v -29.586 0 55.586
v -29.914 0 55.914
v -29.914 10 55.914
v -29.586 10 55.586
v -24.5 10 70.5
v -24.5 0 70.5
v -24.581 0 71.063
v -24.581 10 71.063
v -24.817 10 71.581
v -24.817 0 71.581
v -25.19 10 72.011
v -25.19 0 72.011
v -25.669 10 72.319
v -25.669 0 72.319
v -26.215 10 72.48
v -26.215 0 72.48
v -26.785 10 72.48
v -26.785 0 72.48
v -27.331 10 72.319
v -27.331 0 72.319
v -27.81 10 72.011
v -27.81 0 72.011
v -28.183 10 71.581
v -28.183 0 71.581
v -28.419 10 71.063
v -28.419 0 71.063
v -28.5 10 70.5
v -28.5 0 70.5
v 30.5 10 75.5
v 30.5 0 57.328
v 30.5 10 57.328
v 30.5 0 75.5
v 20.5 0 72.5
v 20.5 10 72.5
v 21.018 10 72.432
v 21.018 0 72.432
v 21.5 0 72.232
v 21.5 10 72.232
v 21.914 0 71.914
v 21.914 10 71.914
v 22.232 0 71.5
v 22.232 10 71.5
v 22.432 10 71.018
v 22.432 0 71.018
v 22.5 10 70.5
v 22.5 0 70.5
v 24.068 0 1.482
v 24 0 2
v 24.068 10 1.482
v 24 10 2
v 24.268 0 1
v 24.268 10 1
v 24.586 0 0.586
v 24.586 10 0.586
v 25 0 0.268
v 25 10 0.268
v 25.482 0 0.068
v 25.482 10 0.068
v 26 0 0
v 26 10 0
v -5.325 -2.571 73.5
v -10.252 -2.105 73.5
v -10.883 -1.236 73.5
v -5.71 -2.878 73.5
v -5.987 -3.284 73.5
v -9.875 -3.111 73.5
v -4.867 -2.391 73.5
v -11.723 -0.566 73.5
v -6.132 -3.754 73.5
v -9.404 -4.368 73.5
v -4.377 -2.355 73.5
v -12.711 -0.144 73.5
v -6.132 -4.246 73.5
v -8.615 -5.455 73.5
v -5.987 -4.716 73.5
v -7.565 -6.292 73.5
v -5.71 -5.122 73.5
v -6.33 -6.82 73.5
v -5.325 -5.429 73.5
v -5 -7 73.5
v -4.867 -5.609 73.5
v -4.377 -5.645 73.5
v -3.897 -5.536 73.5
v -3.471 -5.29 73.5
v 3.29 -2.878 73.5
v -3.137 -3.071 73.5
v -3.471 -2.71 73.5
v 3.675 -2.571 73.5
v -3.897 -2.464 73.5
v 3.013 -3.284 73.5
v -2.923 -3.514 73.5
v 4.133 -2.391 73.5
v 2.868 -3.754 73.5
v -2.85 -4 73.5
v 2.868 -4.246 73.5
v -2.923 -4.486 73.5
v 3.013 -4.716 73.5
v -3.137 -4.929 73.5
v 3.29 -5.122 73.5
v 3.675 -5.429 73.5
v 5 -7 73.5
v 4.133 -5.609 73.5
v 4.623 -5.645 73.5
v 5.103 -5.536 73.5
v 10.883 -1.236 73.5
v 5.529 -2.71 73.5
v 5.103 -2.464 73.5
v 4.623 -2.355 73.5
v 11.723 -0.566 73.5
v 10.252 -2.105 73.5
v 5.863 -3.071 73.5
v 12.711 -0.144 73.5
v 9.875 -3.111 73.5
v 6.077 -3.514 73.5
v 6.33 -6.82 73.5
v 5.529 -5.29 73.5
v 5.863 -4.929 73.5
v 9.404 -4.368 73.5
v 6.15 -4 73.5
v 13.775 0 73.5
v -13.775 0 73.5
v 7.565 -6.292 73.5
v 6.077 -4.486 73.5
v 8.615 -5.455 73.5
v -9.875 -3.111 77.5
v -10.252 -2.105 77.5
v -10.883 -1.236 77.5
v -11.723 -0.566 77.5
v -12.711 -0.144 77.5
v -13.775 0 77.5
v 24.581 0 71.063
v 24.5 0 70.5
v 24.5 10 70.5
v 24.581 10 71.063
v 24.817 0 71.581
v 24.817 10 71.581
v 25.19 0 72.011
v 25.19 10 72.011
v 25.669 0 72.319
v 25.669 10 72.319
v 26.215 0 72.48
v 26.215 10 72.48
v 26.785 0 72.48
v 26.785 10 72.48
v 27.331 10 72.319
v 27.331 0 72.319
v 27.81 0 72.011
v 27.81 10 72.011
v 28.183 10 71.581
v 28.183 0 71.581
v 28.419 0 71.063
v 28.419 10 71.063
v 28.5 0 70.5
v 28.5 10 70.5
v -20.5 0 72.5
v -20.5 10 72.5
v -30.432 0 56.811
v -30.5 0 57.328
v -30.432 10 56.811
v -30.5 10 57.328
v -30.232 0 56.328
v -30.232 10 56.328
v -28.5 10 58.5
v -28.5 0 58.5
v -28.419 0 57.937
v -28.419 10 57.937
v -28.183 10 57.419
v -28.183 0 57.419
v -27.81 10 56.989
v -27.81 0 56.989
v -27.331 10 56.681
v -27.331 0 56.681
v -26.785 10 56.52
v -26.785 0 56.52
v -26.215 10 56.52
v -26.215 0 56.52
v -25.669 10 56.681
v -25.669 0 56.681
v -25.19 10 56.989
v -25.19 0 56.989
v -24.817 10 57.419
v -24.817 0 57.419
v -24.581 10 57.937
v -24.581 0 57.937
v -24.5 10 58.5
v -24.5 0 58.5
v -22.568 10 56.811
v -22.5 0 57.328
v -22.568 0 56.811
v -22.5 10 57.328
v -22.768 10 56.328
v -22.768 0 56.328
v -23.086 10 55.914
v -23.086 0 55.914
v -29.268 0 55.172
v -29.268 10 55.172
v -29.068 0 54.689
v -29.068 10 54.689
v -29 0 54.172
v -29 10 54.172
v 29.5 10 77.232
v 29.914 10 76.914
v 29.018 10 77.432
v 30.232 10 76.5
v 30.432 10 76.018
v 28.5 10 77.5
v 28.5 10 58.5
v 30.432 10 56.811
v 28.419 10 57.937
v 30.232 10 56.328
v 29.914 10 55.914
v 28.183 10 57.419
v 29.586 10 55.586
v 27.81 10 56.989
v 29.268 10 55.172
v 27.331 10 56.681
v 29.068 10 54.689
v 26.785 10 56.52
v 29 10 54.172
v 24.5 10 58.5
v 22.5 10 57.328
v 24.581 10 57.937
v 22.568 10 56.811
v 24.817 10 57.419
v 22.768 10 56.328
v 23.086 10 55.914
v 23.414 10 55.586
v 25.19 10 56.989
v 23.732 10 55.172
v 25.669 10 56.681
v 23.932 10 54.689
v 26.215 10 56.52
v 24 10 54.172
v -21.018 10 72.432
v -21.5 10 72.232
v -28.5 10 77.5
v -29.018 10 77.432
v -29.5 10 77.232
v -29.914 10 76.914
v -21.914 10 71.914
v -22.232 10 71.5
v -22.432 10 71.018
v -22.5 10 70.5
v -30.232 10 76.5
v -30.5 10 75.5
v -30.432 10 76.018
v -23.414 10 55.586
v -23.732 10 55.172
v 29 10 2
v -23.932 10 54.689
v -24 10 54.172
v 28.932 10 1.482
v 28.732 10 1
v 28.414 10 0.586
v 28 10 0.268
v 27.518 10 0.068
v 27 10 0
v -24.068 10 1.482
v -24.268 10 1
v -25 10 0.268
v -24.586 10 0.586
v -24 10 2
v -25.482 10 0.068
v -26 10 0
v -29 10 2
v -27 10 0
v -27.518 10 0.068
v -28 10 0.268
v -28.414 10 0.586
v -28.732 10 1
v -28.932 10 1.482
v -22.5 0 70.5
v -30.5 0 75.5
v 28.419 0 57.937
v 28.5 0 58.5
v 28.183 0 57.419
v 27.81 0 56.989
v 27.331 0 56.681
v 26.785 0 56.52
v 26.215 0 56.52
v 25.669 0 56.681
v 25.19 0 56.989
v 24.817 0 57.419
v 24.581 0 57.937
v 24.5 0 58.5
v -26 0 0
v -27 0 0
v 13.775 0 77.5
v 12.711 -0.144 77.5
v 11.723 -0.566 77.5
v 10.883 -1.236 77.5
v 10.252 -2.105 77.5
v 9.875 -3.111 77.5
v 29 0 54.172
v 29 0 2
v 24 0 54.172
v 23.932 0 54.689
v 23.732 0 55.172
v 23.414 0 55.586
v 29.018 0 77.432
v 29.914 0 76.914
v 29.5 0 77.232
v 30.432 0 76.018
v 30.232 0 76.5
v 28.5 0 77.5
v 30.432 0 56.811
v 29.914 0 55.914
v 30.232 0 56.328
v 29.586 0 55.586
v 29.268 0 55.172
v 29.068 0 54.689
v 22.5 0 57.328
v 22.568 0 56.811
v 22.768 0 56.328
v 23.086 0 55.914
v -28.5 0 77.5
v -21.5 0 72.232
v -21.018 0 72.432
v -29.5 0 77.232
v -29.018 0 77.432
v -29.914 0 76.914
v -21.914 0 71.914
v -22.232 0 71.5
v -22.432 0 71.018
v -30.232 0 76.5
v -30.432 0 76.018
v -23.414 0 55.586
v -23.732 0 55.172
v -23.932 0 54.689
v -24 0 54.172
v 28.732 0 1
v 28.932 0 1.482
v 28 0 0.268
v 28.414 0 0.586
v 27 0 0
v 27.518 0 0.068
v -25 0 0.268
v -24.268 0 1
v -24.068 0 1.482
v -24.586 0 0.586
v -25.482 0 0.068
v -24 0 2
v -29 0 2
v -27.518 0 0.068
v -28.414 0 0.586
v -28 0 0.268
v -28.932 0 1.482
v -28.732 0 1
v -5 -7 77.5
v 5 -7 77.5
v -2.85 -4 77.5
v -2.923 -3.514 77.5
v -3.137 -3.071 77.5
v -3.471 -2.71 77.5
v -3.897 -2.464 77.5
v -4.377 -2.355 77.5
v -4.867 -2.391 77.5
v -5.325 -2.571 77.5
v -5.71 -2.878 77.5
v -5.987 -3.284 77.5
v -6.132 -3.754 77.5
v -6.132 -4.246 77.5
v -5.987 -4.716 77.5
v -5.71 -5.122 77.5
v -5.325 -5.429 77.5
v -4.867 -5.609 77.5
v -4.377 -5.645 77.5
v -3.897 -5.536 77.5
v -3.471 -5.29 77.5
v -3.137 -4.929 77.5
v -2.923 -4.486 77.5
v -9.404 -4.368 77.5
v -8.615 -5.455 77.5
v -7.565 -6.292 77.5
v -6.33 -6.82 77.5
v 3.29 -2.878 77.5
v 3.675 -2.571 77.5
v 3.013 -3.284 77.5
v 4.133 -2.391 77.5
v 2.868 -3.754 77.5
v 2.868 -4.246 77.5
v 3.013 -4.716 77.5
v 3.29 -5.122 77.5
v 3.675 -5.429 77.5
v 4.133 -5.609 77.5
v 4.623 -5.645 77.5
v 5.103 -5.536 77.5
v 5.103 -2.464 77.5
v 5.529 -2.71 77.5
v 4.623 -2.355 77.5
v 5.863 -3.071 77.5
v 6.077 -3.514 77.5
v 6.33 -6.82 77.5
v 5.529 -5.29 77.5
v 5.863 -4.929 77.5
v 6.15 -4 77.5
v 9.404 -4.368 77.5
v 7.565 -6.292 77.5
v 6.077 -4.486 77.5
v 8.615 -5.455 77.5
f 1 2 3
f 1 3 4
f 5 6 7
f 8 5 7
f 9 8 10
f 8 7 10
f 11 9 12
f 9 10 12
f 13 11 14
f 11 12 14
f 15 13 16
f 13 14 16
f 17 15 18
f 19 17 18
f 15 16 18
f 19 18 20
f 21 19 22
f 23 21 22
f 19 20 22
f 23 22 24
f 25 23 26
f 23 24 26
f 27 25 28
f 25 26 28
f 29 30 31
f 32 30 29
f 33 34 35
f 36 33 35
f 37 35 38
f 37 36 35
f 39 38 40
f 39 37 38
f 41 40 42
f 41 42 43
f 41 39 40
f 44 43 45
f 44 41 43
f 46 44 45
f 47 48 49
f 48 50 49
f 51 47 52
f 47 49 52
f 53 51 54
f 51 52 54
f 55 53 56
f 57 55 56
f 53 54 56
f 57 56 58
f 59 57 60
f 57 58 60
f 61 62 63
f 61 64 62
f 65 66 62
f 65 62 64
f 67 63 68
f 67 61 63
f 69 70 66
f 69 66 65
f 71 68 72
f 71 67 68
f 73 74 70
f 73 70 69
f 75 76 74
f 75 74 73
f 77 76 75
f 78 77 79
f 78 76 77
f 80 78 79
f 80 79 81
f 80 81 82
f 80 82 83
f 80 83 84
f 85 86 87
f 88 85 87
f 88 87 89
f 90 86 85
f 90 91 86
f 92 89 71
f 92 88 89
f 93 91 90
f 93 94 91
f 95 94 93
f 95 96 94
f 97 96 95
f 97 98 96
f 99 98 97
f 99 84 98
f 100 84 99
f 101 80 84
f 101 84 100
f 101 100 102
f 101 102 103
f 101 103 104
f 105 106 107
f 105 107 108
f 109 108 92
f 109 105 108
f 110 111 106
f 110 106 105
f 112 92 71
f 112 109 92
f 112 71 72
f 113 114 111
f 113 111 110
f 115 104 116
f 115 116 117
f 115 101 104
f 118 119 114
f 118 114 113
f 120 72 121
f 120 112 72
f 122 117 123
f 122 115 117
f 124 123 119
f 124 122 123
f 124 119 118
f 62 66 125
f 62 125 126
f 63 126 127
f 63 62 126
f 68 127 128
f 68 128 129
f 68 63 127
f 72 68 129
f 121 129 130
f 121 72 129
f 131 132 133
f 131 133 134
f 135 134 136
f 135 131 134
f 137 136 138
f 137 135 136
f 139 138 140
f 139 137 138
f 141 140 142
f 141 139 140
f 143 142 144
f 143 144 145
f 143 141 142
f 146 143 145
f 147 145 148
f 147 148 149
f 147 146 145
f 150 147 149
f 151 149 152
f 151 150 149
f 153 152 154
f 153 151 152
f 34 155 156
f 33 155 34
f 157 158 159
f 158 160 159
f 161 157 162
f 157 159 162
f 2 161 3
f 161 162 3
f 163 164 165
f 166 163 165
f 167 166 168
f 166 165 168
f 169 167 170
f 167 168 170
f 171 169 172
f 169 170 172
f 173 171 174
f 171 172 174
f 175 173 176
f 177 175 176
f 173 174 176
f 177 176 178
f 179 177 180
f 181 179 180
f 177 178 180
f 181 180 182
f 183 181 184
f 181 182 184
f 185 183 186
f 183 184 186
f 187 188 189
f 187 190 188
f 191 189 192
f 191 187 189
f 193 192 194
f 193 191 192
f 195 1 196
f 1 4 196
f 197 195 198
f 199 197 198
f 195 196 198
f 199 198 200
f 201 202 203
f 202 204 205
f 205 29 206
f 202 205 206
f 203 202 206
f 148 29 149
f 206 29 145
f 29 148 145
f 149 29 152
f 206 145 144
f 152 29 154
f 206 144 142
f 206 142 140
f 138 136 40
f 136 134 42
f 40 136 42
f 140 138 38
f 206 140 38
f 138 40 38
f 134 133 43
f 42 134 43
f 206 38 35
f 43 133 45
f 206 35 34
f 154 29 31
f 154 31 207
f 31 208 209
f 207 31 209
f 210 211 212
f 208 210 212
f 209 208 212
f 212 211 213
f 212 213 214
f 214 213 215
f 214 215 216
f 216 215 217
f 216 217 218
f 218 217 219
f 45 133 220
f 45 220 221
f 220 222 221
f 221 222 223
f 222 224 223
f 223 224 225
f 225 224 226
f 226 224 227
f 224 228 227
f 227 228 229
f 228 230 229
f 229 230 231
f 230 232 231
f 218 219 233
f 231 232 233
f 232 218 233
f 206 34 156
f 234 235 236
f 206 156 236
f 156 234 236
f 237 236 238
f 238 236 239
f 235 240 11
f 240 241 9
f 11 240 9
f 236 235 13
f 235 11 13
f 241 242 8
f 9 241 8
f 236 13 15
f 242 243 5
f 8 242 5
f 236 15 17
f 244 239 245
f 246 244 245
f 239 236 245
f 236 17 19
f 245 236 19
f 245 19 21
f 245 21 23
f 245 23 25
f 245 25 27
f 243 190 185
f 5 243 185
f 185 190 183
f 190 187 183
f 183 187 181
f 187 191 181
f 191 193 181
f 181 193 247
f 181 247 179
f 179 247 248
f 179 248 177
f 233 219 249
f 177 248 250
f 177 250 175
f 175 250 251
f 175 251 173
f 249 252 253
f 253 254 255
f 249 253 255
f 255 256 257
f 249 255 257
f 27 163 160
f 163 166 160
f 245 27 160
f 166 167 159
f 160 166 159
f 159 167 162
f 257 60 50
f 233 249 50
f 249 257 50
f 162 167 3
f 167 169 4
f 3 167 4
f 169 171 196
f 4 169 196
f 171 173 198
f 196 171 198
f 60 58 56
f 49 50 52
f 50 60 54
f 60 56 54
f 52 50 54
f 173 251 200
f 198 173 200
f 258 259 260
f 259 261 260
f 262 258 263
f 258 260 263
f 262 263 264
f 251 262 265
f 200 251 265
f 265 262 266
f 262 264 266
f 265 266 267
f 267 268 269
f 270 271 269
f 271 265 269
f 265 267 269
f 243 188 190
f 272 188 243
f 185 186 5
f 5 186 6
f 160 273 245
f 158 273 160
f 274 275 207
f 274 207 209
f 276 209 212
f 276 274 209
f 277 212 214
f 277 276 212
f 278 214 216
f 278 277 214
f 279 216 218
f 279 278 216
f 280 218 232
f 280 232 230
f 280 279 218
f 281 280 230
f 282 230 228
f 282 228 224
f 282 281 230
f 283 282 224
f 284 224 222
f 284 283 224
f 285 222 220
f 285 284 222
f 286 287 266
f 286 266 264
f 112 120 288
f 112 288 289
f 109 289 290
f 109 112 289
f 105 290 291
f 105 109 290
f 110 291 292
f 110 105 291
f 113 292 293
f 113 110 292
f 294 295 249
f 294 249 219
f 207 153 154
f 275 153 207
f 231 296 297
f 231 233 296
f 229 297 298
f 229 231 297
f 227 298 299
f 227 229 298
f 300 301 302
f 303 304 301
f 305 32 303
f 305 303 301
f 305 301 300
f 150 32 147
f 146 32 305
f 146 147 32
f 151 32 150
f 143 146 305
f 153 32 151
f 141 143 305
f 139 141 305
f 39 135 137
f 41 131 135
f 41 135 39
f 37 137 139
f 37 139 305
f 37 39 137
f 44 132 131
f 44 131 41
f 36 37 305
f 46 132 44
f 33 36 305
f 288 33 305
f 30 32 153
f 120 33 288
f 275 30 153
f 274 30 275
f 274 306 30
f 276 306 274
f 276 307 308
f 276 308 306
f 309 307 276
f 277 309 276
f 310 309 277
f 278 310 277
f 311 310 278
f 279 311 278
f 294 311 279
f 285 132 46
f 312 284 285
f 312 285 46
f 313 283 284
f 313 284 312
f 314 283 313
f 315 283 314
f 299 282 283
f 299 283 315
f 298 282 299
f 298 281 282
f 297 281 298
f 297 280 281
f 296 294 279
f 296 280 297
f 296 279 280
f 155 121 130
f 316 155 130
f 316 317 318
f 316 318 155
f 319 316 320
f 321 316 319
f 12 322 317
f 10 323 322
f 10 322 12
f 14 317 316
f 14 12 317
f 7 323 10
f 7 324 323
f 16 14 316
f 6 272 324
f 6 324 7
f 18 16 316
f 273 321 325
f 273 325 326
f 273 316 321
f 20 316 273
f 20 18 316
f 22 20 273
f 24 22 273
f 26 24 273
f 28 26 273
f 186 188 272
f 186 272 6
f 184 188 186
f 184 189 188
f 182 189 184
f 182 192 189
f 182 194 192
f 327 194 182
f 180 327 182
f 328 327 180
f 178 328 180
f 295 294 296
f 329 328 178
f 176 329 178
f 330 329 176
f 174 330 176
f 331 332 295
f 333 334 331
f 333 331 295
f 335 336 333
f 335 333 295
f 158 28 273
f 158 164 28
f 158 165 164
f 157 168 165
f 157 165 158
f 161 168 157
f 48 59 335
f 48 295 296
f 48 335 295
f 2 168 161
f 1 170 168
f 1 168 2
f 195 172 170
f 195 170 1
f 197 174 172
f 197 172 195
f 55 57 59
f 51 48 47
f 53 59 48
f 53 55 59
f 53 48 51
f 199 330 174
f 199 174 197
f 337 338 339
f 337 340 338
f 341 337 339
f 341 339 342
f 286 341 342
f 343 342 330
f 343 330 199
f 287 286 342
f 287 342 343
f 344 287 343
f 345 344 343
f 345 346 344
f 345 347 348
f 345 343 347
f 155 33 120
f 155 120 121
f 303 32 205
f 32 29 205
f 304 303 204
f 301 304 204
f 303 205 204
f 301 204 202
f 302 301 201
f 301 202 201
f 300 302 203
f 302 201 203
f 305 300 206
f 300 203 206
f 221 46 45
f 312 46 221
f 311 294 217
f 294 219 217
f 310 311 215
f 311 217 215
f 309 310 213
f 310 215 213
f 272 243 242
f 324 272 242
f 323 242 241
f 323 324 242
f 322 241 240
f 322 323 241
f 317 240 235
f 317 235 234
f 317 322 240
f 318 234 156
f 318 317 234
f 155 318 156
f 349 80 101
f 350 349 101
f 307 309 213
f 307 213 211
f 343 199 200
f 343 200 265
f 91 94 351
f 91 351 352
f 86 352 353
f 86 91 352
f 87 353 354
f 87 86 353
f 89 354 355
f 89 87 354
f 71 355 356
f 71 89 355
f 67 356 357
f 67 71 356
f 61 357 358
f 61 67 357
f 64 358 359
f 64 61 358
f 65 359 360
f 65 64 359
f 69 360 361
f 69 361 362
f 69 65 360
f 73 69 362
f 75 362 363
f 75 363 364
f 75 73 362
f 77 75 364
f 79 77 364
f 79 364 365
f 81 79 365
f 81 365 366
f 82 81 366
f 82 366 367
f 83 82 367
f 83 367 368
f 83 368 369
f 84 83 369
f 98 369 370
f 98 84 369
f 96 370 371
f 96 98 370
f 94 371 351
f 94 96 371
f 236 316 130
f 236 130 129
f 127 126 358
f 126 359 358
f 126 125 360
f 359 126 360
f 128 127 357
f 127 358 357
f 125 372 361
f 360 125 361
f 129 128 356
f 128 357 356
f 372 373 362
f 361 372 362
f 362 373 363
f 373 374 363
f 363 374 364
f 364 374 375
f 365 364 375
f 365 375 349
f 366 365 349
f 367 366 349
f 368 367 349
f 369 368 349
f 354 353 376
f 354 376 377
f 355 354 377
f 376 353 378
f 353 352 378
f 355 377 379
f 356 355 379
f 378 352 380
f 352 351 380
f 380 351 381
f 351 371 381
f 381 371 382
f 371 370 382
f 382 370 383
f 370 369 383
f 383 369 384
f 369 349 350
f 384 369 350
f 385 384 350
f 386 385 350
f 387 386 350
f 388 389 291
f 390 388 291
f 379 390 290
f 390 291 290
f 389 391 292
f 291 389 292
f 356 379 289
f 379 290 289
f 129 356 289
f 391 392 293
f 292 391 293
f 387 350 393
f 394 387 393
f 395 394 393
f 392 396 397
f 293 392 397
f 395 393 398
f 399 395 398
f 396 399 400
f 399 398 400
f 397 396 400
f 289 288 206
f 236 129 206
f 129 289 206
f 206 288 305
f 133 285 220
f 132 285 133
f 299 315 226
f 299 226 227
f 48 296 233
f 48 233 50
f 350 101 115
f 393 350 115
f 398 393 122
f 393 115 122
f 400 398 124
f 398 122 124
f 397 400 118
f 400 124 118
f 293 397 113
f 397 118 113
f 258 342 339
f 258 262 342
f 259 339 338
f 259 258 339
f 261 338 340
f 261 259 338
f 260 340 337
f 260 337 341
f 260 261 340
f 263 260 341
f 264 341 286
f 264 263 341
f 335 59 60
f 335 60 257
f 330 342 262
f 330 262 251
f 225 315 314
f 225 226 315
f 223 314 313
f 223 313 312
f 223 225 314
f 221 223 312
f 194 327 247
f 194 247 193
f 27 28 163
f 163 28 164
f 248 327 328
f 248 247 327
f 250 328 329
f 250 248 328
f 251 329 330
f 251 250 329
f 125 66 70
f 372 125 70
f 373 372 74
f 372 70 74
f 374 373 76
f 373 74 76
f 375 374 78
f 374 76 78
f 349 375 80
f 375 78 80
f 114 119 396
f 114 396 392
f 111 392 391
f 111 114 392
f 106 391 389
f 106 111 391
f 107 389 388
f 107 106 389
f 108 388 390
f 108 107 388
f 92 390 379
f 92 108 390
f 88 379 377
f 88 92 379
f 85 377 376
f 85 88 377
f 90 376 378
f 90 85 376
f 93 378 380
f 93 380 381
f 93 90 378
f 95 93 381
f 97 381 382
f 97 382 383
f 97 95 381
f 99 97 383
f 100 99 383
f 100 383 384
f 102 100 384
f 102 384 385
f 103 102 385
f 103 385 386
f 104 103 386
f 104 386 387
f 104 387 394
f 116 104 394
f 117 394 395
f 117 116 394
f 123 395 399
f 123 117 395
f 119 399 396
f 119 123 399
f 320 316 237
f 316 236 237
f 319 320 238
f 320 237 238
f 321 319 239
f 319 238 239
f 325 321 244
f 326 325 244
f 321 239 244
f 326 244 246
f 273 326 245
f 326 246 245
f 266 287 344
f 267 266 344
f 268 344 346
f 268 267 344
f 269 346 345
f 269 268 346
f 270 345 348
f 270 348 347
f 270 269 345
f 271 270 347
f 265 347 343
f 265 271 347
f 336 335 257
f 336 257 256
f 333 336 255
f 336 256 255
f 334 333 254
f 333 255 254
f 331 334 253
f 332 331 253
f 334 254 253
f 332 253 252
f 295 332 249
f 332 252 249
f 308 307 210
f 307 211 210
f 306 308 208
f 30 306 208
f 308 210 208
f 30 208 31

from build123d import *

# Parameters (mm, degrees)
BOSS_EXTRUDE1_DEPTH = 10
FILLET1_R           = 2
FILLET2_R           = 2
BLOCK_START         = 73.5
BLOCK_OUTLINE_R     = 1.65
BLOCK_DEPTH         = 4
BLOCK_START_2       = 77.5
BLOCK_2_DEPTH       = 0.2
CUT_EXTRUDE1_START  = -0.2
CUT_EXTRUDE1_DEPTH  = 0.2
FILLET4_R           = 4


# Read off the part's stored shape, not the designer's step: block
with BuildPart() as part:
    # Sketch1 → Boss-Extrude1 (new body)
    with BuildSketch(Plane(origin=(0, 0, 0), x_dir=(1, 0, 0), z_dir=(0, 1, 0))):
        with BuildLine():
            Line((24, -55), (24, 0))
            Line((24, 0), (29, 0))
            Line((29, 0), (29, -55))
            Line((29, -55), (30.5, -56.5))
            Line((30.5, -56.5), (30.5, -70.5))
            Line((30.5, -70.5), (30.5, -77.5))
            Line((30.5, -77.5), (-30.5, -77.5))
            Line((-30.5, -77.5), (-30.5, -70.5))
            Line((-30.5, -70.5), (-30.5, -56.5))
            Line((-30.5, -56.5), (-29, -55))
            Line((-29, -55), (-29, 0))
            Line((-29, 0), (-24, 0))
            Line((-24, 0), (-24, -55))
            Line((-24, -55), (-22.5, -56.5))
            Line((-22.5, -56.5), (-22.5, -70.5))
            ThreePointArc((-22.5, -70.5), (-21.914213562, -71.914213562), (-20.5, -72.5))
            Line((-20.5, -72.5), (20.5, -72.5))
            ThreePointArc((20.5, -72.5), (21.914213562, -71.914213562), (22.5, -70.5))
            Line((22.5, -70.5), (22.5, -56.5))
            Line((22.5, -56.5), (24, -55))
        make_face()
        with BuildLine():
            Line((24.5, -58.5), (24.5, -70.5))
            ThreePointArc((24.5, -70.5), (26.5, -72.5), (28.5, -70.5))
            Line((28.5, -70.5), (28.5, -58.5))
            ThreePointArc((28.5, -58.5), (26.5, -56.5), (24.5, -58.5))
        make_face(mode=Mode.SUBTRACT)
        with BuildLine():
            Line((-28.5, -70.5), (-28.5, -58.5))
            ThreePointArc((-28.5, -58.5), (-26.5, -56.5), (-24.5, -58.5))
            Line((-24.5, -58.5), (-24.5, -70.5))
            ThreePointArc((-24.5, -70.5), (-26.5, -72.5), (-28.5, -70.5))
        make_face(mode=Mode.SUBTRACT)
    extrude(amount=BOSS_EXTRUDE1_DEPTH)

    # Fillet1
    fillet1_edges = [part.edges().sort_by_distance(p)[0] for p in [
        (30.5, 5, 77.5),
        (-30.5, 5, 77.5),
        (-30.5, 5, 56.5),
        (-29, 5, 55),
        (-24, 5, 55),
        (-22.5, 5, 56.5),
        (22.5, 5, 56.5),
        (24, 5, 55),
        (29, 5, 55),
        (30.5, 5, 56.5),
    ]]
    fillet(fillet1_edges, radius=FILLET1_R)

    # Fillet2
    fillet2_edges = [part.edges().sort_by_distance(p)[0] for p in [
        (-29, 5, 0),
        (-24, 5, 0),
        (24, 5, 0),
        (29, 5, 0),
    ]]
    fillet(fillet2_edges, radius=FILLET2_R)


with BuildPart() as body_2:
    # block outline → block (new body)
    with BuildSketch(Plane.XY.offset(BLOCK_START)):
        with BuildLine():
            Line((-10, 0), (-10, -2))
            ThreePointArc((-10, -2), (-8.535533906, -5.535533906), (-5, -7))
            Line((-5, -7), (5, -7))
            ThreePointArc((5, -7), (8.535533906, -5.535533906), (10, -2))
            Line((10, -2), (10, 0))
            Line((10, 0), (-10, 0))
        make_face()
        with Locations((-4.5, -4)):
            Circle(BLOCK_OUTLINE_R, mode=Mode.SUBTRACT)
        with Locations((4.5, -4)):
            Circle(BLOCK_OUTLINE_R, mode=Mode.SUBTRACT)
    extrude(amount=BLOCK_DEPTH)

    # block 2 outline → block 2 (add)
    with BuildSketch(Plane.XY.offset(BLOCK_START_2)):
        with BuildLine():
            ThreePointArc((-3, -0.5), (-3.2, -0.7), (-3, -0.9))
            Line((-3, -0.9), (3, -0.9))
            ThreePointArc((3, -0.9), (3.2, -0.7), (3, -0.5))
            Line((3, -0.5), (-3, -0.5))
        make_face()
    extrude(amount=BLOCK_2_DEPTH)


with BuildPart() as part_1:
    add(part.part)

    # Combine1: union body 2
    add(body_2.part)

    # Sketch3 → Cut-Extrude1 (cut)
    with BuildSketch(Plane.XY.offset(77.7).offset(CUT_EXTRUDE1_START)):
        with BuildLine():
            Line((-3, -0.9), (3, -0.9))
            ThreePointArc((3, -0.9), (3.2, -0.7), (3, -0.5))
            Line((3, -0.5), (-3, -0.5))
            ThreePointArc((-3, -0.5), (-3.2, -0.7), (-3, -0.9))
        make_face()
    extrude(amount=CUT_EXTRUDE1_DEPTH, mode=Mode.SUBTRACT)

    # Fillet4
    # the kernel refuses this fillet: 4 mm, written as the material it adds along each edge
    with BuildSketch(Plane(origin=(10, 0, 73.5), x_dir=(1, 0, 0), z_dir=(0, 0, 1))) as fillet4_piece_1:
        with BuildLine():
            CenterArc((3.774964387, -4), FILLET4_R, 90, 77.160411594)
            Line((-0.125019785, -3.111111111), (-0.515018202, -3.022222222))
            ThreePointArc((-0.515018202, -3.022222222), (-0.4, -2), (-0.4, 0))
            Line((-0.4, 0), (0, 0.4))
            Line((0, 0.4), (3.774964387, 0.4))
            Line((3.774964387, 0.4), (3.774964387, 0))
        make_face()
    extrude(amount=4)
    with BuildSketch(Plane(origin=(-10, 0, 73.5), x_dir=(-1, 0, 0), z_dir=(0, 0, 1))) as fillet4_piece_2:
        with BuildLine():
            CenterArc((3.774964387, 4), FILLET4_R, 192.839588406, 77.160411594)
            Line((-0.125019785, 3.111111111), (-0.515018202, 3.022222222))
            ThreePointArc((-0.515018202, 3.022222222), (-0.4, 2), (-0.4, 0))
            Line((-0.4, 0), (0, -0.4))
            Line((0, -0.4), (3.774964387, -0.4))
            Line((3.774964387, -0.4), (3.774964387, 0))
        make_face()
    extrude(amount=4)


solid = part_1.part
